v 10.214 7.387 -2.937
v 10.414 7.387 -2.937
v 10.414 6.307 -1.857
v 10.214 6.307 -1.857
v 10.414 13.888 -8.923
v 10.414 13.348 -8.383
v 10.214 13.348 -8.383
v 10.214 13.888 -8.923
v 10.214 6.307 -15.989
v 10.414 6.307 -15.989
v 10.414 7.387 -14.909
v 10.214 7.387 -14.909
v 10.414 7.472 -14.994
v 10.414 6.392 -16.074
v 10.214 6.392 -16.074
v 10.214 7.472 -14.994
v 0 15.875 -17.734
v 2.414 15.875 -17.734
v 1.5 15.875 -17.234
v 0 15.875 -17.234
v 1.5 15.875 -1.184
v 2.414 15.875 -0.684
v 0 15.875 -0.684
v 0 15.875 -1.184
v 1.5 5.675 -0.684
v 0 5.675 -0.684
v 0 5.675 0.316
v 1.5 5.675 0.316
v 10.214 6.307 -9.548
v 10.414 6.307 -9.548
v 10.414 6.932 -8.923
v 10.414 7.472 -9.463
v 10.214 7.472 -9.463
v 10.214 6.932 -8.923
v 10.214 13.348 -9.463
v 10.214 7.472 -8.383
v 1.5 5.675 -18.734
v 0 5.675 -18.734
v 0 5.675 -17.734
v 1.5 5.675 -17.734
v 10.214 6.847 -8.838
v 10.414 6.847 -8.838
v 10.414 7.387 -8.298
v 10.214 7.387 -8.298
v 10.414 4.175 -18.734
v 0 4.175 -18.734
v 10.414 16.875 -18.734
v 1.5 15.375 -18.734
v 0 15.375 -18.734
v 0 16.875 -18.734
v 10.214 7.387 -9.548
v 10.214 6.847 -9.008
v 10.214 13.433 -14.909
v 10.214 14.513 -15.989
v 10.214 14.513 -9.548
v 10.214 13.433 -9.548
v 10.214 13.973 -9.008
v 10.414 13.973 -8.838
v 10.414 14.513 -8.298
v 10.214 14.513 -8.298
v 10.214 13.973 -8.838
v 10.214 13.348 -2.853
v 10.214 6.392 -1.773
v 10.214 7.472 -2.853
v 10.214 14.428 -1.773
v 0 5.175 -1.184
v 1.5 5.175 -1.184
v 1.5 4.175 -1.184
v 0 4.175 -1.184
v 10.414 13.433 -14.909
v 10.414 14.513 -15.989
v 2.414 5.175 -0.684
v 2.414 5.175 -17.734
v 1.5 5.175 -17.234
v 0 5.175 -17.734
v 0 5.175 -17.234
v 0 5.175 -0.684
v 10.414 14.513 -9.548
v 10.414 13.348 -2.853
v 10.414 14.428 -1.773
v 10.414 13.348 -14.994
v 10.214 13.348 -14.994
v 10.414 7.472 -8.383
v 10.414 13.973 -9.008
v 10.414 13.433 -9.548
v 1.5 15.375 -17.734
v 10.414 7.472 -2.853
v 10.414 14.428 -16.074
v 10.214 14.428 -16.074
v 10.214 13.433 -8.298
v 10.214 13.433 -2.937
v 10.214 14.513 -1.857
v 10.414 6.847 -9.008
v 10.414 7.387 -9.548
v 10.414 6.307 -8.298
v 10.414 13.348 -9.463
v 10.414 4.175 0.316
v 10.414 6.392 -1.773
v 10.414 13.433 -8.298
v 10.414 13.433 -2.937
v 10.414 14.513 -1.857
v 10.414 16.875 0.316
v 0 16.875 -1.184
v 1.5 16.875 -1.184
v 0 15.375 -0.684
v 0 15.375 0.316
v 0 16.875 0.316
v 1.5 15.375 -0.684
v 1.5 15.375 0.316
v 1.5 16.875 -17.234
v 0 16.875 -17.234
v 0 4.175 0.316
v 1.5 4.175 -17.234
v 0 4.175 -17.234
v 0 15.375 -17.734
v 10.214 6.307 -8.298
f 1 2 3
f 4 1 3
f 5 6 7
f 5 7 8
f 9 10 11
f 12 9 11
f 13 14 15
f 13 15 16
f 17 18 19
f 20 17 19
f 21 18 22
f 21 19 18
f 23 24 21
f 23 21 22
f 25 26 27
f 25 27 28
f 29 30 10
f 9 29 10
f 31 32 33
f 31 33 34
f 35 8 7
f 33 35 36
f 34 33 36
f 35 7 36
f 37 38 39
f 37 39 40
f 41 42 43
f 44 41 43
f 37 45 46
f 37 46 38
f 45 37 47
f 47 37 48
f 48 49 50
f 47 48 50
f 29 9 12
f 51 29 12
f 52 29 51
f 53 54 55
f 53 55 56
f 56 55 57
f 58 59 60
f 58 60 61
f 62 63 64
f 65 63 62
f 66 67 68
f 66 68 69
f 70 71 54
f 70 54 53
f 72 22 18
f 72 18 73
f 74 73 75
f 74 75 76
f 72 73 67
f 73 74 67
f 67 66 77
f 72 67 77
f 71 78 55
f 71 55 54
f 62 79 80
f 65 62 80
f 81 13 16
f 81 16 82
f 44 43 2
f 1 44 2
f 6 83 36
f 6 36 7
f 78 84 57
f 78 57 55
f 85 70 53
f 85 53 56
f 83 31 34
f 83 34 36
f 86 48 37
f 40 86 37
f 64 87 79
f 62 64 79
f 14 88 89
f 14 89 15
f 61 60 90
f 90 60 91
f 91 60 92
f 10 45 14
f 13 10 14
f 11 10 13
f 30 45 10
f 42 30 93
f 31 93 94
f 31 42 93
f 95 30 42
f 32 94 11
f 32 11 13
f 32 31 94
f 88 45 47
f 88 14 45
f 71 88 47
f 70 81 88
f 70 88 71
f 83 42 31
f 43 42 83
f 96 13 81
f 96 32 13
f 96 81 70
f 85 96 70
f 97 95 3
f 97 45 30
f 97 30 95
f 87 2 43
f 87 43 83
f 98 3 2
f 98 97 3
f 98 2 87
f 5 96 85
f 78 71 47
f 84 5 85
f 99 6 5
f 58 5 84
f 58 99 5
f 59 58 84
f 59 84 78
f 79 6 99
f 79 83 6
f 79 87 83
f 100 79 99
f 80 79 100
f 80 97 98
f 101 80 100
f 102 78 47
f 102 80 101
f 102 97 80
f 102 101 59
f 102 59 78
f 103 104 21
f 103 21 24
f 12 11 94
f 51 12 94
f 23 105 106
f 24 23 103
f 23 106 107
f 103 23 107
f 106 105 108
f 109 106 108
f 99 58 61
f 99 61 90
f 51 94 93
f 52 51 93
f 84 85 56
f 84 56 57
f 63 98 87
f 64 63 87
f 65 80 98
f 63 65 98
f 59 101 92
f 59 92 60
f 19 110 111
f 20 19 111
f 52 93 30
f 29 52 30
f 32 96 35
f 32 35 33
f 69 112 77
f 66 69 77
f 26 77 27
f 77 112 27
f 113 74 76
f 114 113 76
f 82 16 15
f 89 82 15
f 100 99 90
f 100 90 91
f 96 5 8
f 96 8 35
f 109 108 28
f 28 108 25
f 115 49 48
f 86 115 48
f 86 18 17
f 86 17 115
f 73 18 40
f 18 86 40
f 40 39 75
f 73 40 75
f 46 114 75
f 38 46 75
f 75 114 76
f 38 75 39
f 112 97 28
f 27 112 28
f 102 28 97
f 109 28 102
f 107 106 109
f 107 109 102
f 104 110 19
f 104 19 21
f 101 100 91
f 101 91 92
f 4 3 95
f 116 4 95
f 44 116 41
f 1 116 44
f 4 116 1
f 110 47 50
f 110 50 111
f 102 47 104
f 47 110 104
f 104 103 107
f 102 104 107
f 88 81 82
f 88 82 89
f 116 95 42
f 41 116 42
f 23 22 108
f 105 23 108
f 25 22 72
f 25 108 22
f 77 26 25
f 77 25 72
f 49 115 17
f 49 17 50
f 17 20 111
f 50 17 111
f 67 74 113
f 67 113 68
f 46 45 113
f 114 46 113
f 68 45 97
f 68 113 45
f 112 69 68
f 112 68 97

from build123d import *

# Parameters (mm, degrees)
SKETCH1_W           = 12.7
SKETCH1_H           = 19.05
BOSS_EXTRUDE1_DEPTH = 10.414
SKETCH2_W           = 10.7
SKETCH2_H           = 17.05
CUT_EXTRUDE1_DEPTH  = 2.414
SKETCH4_W           = 1.5
SKETCH4_H           = 16.05
CUT_EXTRUDE2_DEPTH  = 42.414
SKETCH5_W           = 1.5
SKETCH5_H           = 9.7
CUT_EXTRUDE3_DEPTH  = 42.414
CUT_EXTRUDE4_DEPTH  = 0.2


with BuildPart() as part:
    # Sketch1 → Boss-Extrude1 (new body)
    with BuildSketch(Plane.YZ):
        with Locations((10.524991597, -9.20910084)):
            Rectangle(SKETCH1_W, SKETCH1_H)
    extrude(amount=BOSS_EXTRUDE1_DEPTH)

    # Sketch2 → Cut-Extrude1 (cut)
    with BuildSketch(Plane(origin=(0, 0, 0), x_dir=(0, -1, 0), z_dir=(-1, 0, 0))):
        with Locations((-10.524991597, -9.20910084)):
            Rectangle(SKETCH2_W, SKETCH2_H)
    extrude(amount=-CUT_EXTRUDE1_DEPTH, mode=Mode.SUBTRACT)

    # Sketch4 → Cut-Extrude2 (cut)
    with BuildSketch(Plane(origin=(0, 16.874991597, 0), x_dir=(-1, 0, 0), z_dir=(0, 1, 0))):
        with Locations((-0.75, -9.20910084)):
            Rectangle(SKETCH4_W, SKETCH4_H)
    extrude(amount=-CUT_EXTRUDE2_DEPTH, mode=Mode.SUBTRACT)

    # Sketch5 → Cut-Extrude3 (cut)
    with BuildSketch(Plane(origin=(0, 0, -18.73410084), x_dir=(1, 0, 0), z_dir=(0, 0, -1))):
        with Locations((0.75, -10.524991597)):
            Rectangle(SKETCH5_W, SKETCH5_H)
    extrude(amount=-CUT_EXTRUDE3_DEPTH, mode=Mode.SUBTRACT)

    # Sketch6 → Cut-Extrude4 (cut)
    with BuildSketch(Plane.YZ.offset(10.414)):
        Polygon((7.471753677, -14.994134662), (13.347648049, -14.994134662), (14.427648049, -16.074134662), (6.391753677, -16.074134662), align=None)
        Polygon((14.427648049, -1.772534662), (6.391753677, -1.772534662), (7.471753677, -2.852534662), (13.347648049, -2.852534662), align=None)
        Polygon((13.432500863, -14.909281848), (13.432500863, -9.548187475), (13.972500863, -9.008187475), (14.512500863, -9.548187475), (14.512500863, -15.989281848), align=None)
        Polygon((7.386900863, -2.937387475), (6.306900863, -1.857387475), (6.306900863, -8.298481848), (6.846900863, -8.838481848), (7.386900863, -8.298481848), align=None)
        Polygon((13.432500863, -2.937387475), (14.512500863, -1.857387475), (14.512500863, -8.298481848), (13.972500863, -8.838481848), (13.432500863, -8.298481848), align=None)
        Polygon((7.471753677, -8.383334662), (13.347648049, -8.383334662), (13.887648049, -8.923334662), (13.347648049, -9.463334662), (7.471753677, -9.463334662), (6.931753677, -8.923334662), align=None)
        Polygon((6.846900863, -9.008187475), (6.306900863, -9.548187475), (6.306900863, -15.989281848), (7.386900863, -14.909281848), (7.386900863, -9.548187475), align=None)
    extrude(amount=-CUT_EXTRUDE4_DEPTH, mode=Mode.SUBTRACT)


solid = part.part
